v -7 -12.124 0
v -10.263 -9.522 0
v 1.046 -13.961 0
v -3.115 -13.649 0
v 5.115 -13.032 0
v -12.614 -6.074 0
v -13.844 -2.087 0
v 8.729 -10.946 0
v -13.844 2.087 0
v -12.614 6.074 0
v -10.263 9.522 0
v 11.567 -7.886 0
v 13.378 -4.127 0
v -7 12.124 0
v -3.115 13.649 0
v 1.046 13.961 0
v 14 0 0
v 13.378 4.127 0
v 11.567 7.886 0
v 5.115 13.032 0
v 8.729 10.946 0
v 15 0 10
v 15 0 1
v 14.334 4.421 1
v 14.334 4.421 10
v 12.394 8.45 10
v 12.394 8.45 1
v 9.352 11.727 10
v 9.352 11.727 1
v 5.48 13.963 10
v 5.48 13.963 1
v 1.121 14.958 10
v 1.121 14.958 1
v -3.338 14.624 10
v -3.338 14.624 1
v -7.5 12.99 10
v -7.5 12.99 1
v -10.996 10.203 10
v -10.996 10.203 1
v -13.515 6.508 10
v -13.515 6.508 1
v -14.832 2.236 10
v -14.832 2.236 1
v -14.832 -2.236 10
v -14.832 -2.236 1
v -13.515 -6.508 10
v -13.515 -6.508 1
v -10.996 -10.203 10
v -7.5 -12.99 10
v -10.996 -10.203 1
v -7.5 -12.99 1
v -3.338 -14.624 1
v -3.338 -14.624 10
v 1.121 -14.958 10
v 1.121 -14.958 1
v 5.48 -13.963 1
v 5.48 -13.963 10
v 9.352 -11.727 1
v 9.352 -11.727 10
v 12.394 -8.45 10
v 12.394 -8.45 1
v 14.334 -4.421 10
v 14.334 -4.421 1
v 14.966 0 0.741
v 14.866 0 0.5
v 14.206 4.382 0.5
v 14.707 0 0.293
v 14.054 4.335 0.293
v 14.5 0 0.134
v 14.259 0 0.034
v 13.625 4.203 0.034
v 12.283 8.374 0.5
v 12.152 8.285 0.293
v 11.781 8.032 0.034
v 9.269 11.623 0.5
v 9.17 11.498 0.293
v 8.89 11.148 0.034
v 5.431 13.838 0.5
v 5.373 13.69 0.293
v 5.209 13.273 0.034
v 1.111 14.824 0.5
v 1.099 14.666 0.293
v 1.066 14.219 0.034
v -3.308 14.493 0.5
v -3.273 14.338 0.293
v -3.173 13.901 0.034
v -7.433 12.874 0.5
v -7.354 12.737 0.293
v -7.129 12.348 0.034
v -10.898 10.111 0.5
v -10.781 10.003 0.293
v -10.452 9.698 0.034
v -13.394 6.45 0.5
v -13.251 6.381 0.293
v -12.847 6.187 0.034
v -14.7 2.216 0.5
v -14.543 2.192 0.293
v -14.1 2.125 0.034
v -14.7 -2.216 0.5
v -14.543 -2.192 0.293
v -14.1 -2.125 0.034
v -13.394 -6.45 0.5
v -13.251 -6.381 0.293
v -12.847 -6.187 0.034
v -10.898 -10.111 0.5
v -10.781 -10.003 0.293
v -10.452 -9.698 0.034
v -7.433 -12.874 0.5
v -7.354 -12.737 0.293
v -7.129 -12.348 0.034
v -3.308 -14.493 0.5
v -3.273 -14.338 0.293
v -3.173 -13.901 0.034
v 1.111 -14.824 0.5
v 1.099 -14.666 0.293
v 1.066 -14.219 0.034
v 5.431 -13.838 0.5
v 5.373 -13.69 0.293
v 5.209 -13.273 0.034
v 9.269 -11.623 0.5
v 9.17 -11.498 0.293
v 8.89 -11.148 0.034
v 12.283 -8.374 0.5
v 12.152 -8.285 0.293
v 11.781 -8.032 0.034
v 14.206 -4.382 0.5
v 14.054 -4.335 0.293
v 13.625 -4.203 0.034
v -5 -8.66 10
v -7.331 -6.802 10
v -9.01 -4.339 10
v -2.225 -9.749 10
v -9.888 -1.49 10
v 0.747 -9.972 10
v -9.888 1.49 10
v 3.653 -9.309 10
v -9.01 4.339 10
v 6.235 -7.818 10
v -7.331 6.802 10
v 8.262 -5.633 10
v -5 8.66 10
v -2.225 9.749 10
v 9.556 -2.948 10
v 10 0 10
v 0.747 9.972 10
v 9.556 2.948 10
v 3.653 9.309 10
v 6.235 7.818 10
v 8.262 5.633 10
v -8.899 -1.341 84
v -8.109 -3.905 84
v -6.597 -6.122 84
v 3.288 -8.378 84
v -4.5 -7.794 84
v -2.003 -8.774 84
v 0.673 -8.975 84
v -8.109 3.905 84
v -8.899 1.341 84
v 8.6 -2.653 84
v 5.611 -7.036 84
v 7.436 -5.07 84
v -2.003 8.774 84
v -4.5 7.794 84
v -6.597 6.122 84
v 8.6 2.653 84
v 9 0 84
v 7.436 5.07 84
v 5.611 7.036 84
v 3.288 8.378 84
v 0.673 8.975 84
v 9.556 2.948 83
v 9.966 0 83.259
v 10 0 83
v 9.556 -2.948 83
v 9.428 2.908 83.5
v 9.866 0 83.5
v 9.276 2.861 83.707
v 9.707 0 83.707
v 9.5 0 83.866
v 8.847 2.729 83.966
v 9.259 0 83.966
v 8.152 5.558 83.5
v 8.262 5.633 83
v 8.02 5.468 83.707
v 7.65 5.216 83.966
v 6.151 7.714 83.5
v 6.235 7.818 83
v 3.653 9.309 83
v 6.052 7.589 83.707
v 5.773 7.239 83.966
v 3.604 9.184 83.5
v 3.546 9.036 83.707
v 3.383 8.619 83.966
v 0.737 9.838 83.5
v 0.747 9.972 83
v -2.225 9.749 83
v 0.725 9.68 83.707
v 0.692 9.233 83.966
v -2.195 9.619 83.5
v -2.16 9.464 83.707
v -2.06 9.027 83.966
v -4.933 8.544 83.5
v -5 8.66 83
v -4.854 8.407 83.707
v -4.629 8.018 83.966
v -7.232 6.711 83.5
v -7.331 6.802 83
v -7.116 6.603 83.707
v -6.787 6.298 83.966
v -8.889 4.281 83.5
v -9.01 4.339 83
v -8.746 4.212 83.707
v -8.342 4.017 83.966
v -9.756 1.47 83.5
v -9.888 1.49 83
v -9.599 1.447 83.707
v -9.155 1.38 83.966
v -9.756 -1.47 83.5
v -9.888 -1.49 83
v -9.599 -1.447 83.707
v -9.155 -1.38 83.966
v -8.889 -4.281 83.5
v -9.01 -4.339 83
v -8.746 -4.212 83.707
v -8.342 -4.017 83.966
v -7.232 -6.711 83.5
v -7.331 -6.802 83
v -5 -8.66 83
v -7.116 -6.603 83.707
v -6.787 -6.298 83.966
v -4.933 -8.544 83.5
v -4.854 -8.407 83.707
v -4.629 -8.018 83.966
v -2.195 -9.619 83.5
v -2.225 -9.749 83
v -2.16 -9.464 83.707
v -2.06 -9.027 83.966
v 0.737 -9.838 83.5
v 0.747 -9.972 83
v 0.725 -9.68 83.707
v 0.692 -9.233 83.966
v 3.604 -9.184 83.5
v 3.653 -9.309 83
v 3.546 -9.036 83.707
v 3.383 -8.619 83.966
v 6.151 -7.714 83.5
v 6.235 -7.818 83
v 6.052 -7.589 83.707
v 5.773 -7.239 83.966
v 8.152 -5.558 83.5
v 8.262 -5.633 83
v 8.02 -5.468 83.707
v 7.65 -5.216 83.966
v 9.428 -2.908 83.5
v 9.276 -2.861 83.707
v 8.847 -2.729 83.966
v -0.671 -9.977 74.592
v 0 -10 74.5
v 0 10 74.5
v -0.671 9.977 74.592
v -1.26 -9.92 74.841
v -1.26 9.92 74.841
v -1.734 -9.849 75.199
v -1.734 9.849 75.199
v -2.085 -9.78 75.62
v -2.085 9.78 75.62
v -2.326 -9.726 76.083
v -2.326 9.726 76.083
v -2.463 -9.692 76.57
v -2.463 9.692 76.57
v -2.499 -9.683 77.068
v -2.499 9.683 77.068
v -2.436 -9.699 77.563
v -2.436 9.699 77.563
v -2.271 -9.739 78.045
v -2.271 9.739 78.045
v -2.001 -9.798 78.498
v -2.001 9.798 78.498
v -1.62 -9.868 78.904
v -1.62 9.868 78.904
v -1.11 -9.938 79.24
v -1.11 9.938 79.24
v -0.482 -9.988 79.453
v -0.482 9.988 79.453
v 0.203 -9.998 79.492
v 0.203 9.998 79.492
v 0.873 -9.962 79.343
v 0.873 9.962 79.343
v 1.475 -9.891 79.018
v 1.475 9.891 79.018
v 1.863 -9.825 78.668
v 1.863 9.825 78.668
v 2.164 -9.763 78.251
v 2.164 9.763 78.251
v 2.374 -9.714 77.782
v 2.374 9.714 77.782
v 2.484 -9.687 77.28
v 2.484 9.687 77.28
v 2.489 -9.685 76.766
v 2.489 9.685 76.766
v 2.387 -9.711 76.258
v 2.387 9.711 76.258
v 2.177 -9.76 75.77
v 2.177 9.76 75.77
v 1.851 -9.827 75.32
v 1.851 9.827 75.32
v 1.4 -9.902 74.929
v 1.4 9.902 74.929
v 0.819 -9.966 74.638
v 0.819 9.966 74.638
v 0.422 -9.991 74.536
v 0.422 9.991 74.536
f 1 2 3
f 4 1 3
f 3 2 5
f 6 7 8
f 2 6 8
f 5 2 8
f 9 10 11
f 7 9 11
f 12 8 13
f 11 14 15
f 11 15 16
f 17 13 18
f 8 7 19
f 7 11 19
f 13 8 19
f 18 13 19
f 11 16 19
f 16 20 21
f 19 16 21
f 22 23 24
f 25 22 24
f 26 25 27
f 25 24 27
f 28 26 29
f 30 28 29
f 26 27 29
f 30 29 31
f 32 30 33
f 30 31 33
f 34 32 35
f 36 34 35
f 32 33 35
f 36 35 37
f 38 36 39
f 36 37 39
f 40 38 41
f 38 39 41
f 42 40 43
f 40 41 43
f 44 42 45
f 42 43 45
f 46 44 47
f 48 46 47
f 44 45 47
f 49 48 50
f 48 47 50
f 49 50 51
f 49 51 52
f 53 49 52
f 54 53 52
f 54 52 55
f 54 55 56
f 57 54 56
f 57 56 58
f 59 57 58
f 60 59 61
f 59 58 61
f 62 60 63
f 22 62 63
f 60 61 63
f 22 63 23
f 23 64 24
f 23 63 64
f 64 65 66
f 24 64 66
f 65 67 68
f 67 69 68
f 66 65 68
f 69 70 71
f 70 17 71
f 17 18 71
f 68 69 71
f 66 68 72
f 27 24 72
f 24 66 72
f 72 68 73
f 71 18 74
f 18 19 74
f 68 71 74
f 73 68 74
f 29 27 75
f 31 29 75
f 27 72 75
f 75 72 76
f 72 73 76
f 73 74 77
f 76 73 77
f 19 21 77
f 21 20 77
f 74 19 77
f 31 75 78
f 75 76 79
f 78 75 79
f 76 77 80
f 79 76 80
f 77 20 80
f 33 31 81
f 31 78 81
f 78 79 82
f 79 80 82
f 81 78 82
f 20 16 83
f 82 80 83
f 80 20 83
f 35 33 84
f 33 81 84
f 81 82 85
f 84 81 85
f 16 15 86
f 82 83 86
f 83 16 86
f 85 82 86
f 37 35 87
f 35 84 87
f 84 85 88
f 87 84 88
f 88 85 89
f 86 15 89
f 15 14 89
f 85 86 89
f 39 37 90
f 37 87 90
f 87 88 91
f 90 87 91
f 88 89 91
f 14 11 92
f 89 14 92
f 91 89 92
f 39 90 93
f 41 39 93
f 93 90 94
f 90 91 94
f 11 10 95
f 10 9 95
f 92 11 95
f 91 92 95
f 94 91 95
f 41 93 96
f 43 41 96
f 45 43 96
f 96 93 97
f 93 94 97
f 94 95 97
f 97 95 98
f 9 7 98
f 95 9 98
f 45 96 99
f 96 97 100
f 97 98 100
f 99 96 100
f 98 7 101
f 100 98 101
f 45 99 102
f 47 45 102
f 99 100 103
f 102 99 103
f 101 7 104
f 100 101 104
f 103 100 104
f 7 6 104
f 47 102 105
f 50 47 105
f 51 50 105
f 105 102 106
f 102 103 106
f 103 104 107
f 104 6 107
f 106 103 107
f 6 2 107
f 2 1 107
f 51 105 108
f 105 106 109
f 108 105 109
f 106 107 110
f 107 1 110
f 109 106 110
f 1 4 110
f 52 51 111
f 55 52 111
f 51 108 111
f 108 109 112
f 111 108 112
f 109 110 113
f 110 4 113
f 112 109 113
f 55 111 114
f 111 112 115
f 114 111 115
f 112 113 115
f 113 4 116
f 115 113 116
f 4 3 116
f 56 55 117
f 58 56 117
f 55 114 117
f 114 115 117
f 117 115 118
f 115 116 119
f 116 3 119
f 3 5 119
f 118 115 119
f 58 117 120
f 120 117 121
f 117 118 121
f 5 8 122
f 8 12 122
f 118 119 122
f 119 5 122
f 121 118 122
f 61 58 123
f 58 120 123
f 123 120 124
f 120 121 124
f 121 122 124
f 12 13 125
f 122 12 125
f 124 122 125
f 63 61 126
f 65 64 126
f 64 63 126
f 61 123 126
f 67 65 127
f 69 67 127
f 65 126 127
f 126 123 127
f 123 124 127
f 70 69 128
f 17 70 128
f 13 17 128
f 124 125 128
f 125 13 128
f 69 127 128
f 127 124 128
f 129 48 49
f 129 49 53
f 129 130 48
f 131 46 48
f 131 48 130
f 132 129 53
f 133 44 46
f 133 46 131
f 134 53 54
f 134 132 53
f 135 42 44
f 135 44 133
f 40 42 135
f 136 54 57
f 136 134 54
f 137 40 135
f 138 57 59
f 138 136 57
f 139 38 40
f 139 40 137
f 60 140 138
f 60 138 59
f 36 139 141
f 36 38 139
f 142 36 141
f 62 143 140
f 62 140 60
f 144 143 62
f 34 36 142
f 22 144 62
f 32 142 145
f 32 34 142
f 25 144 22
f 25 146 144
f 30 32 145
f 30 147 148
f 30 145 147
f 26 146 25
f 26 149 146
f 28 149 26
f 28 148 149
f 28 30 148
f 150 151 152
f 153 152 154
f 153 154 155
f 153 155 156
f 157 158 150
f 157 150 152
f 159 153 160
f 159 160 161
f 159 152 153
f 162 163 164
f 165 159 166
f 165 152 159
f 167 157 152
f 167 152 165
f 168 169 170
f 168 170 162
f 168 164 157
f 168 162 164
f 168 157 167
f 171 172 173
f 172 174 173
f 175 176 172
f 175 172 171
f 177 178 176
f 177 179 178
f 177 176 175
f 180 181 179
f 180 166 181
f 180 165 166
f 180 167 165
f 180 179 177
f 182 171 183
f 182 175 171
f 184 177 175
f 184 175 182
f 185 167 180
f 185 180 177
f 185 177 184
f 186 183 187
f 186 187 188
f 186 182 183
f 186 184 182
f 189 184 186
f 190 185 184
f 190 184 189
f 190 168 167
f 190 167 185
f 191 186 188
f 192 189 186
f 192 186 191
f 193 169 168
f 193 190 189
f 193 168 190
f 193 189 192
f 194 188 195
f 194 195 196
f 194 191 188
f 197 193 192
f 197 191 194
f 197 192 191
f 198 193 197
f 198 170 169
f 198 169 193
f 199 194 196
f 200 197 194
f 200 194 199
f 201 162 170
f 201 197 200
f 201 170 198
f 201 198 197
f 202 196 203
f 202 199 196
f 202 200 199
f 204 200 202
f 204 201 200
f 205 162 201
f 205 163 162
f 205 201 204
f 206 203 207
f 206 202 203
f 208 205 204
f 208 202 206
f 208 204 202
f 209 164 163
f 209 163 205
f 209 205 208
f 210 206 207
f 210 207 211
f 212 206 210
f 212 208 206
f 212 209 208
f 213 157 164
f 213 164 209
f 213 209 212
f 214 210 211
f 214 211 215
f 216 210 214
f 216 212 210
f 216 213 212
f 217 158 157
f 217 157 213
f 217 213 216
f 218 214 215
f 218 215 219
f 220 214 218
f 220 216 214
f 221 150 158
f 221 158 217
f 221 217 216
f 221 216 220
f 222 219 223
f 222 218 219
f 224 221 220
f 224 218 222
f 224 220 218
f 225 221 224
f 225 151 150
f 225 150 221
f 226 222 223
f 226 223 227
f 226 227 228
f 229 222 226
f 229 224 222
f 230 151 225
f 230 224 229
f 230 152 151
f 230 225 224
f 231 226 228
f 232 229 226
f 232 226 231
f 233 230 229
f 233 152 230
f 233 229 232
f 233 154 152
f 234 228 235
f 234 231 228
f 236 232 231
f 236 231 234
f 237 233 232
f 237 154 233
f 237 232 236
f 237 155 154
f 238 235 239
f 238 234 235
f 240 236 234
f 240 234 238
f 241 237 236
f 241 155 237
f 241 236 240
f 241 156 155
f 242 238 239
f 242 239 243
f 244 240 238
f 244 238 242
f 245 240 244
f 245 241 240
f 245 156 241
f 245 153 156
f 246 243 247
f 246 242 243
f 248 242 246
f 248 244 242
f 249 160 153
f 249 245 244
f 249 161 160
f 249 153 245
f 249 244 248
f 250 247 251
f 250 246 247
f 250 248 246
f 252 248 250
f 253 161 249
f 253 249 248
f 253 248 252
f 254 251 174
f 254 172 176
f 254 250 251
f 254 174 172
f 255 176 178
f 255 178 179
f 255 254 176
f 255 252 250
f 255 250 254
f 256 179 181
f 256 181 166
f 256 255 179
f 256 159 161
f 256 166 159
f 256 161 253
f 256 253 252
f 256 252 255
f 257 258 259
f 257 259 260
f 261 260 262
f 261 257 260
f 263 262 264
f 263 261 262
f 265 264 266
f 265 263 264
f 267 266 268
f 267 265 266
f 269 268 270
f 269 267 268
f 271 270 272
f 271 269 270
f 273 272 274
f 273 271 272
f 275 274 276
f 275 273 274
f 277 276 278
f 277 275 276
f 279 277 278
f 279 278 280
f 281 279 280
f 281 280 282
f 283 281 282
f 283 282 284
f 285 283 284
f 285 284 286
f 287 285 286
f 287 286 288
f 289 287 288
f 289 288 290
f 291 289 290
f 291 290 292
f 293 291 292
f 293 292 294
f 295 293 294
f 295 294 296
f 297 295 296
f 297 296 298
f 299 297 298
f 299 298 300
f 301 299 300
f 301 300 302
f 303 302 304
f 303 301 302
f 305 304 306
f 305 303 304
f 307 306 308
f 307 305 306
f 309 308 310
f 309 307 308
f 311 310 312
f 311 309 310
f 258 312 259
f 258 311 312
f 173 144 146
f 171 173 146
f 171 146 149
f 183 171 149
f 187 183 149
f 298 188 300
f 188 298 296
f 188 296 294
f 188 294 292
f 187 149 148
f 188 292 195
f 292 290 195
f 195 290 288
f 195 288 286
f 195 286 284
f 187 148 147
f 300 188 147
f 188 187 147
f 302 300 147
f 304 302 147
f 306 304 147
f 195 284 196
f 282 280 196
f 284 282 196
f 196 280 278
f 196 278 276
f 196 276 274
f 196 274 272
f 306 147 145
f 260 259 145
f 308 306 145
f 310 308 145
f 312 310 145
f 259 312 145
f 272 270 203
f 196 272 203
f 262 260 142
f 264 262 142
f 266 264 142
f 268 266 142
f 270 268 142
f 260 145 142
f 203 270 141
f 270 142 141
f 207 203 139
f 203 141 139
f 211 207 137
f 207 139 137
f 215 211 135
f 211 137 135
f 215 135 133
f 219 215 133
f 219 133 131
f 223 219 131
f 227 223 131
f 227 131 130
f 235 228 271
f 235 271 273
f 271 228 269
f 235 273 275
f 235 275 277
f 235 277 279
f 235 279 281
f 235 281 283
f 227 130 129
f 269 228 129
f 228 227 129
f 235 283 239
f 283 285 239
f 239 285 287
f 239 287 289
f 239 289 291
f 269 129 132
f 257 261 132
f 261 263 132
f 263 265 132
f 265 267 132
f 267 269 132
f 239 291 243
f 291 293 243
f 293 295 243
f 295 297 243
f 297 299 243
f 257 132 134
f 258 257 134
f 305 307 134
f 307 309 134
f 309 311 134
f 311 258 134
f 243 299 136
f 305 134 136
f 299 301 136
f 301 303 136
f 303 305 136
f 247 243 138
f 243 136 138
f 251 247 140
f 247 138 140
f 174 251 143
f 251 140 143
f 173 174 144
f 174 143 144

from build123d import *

# Parameters (mm, degrees)
SKETCH1_R               = 15
BOSS_EXTRUDE1_DEPTH     = 10
SKETCH2_R               = 10
BOSS_EXTRUDE2_DEPTH     = 74
CUT_EXTRUDE1_DEPTH      = 74
CUT_EXTRUDE1_DEPTH_BACK = 74
SKETCH3_R               = 2.5
FILLET1_R               = 1
FILLET2_R               = 1


with BuildPart() as part:
    # Sketch1 → Boss-Extrude1 (new body)
    with BuildSketch(Plane.XY):
        Circle(SKETCH1_R)
    extrude(amount=BOSS_EXTRUDE1_DEPTH)

    # Sketch2 → Boss-Extrude2 (add)
    with BuildSketch(Plane.XY.offset(10)):
        Circle(SKETCH2_R)
    extrude(amount=BOSS_EXTRUDE2_DEPTH)

    # Sketch3 → Cut-Extrude1 (cut, two sides: drawn at the far end of the back side and taken through both)
    with BuildSketch(Plane(origin=(0, 0, 0), x_dir=(1, 0, 0), z_dir=(0, 1, 0)).offset(-CUT_EXTRUDE1_DEPTH_BACK)):
        with Locations((0, -77)):
            Circle(SKETCH3_R)
    extrude(amount=CUT_EXTRUDE1_DEPTH + CUT_EXTRUDE1_DEPTH_BACK, mode=Mode.SUBTRACT)

    # Fillet1
    fillet1_edges = [part.edges().sort_by_distance(p)[0] for p in [
        (-15, 0, 0),
    ]]
    fillet(fillet1_edges, radius=FILLET1_R)

    # Fillet2
    fillet2_edges = [part.edges().sort_by_distance(p)[0] for p in [
        (-10, 0, 84),
    ]]
    fillet(fillet2_edges, radius=FILLET2_R)


solid = part.part
